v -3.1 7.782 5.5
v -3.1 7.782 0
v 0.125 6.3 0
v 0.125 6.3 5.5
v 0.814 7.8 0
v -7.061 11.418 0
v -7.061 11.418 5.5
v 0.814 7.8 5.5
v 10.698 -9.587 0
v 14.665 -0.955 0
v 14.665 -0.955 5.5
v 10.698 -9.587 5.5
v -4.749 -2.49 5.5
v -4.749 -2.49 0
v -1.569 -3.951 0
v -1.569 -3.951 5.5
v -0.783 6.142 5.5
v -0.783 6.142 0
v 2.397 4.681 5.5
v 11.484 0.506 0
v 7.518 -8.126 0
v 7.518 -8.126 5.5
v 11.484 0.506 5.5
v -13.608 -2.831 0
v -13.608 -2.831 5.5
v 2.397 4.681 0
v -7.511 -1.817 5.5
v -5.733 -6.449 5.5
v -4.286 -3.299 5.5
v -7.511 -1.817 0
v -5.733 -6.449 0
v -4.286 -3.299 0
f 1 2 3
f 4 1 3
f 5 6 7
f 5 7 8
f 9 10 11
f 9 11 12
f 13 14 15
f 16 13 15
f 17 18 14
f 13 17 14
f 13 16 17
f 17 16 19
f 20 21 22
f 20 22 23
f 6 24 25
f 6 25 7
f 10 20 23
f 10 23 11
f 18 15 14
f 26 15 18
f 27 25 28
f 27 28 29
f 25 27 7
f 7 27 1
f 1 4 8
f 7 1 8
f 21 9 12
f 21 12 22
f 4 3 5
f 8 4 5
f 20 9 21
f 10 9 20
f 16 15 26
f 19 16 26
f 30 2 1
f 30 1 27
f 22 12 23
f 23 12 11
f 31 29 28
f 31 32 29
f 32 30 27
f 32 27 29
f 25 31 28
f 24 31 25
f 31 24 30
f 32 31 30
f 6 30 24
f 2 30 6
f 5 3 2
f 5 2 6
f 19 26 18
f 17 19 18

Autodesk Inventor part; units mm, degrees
ref_plane "YZ Plane" through (0, 0, 0) normal (1, 0, 0) x (0, 1, 0)
ref_plane "XZ Plane" through (0, 0, 0) normal (0, 1, 0) x (-1, 0, 0)
ref_plane "XY Plane" through (0, 0, 0) normal (0, 0, 1) x (1, 0, 0)
ref_plane "Work Plane1" through (0, 0, 0) normal (0, 0, 1) x (1, 0, 0)
ref_plane "Work Plane2" through (15.8127, -3.2465, 0) normal (0, 0, -1) x (0.4175, 0.9087, 0)
sketch "Sketch1" plane through (15.8127, -3.2465, 0) normal (0, 0, -1) x (0.4175, 0.9087, 0)
  arc A0 (9.303, -26.8555) -> (8.303, -25.8555) centre (8.303, -26.8555) ccw construction
  line L0 (9.303, -26.8555) -> (9.303, -30) construction
  line L1 (9.303, -30) -> (-16.397, -30) construction
  line L2 (-16.397, -30) -> (-16.397, -20.4723) construction
  arc A1 (-15.397, -19.4723) -> (-16.397, -20.4723) centre (-15.397, -20.4723) ccw construction
  line L3 (-15.397, -19.4723) -> (-13.5347, -19.4723) construction
  arc A2 (-13.5347, -19.4723) -> (-12.5347, -18.4723) centre (-13.5347, -18.4723) ccw construction
  line L4 (-12.5347, -18.4723) -> (-12.5347, 0) construction
  line L5 (-12.5347, 0) -> (-1, 0) construction
  arc A3 (-1, 0) -> (0, 1) centre (-1, 1) ccw construction
  line L6 (0, 1) -> (0, 2) construction
  arc A4 (1, 3) -> (0, 2) centre (1, 2) ccw construction
  line L7 (1, 3) -> (3.5653, 3) construction
  arc A5 (4.5653, 2) -> (3.5653, 3) centre (3.5653, 2) ccw construction
  line L8 (4.5653, 2) -> (4.5653, -24.8555) construction
  arc A6 (4.5653, -24.8555) -> (5.5653, -25.8555) centre (5.5653, -24.8555) ccw construction
  line L9 (5.5653, -25.8555) -> (8.303, -25.8555) construction
  line L10 (2.603, -17.5) -> (2.603, -2) construction
  line L11 (2.603, -2) -> (-10.897, -2) construction
  line L12 (-10.897, -2) -> (-10.897, -17.5) construction
  line L13 (-10.897, -17.5) -> (2.603, -17.5) construction
  circle A7 centre (6.603, -27.5) radius 1 construction
  circle A8 centre (-13.897, -21) radius 1 construction
  circle A9 centre (1.603, 0.5) radius 1 construction
  line L14 (1.603, -19) -> (-7.897, -19)
  line L15 (-7.897, -19) -> (-7.897, -15.5)
  line L16 (-7.897, -15.5) -> (1.603, -15.5)
  line L17 (1.603, -15.5) -> (1.603, -19)
  line L18 (1.603, -2) -> (-7.897, -2)
  line L19 (-7.897, -2) -> (-7.897, -5.5)
  line L20 (-7.897, -5.5) -> (1.603, -5.5)
  line L21 (1.603, -5.5) -> (1.603, -2)
  point P0 (-3.6519, -15.7241)
  dimension "d0" = 9.5
  dimension "d1" = 3.5
  dimension "d2" = 9.5
  dimension "d3" = 3.5
  dimension "d4" = 0
  dimension "d5" = 2.5
  dimension "d6" = 10
  dimension "d7" = 0
extrude "Extrusion1" add sketch "Sketch1" against normal blind 5.5
ref_plane "Work Plane3" through (0, 0, -1) normal (0, 0, -1) x (-1, 0, 0)
sketch "Sketch2" plane through (15.8127, -3.2465, 0) normal (0, 0, -1) x (0.4175, 0.9087, 0)
  line L0 (-11.9051, -26.9073) -> (3.7761, -26.9073)
  line L1 (3.7761, -26.9073) -> (3.7761, -21.7902)
  line L2 (3.7761, -21.7902) -> (-11.9051, -21.7902)
  line L3 (-11.9051, -21.7902) -> (-11.9051, -26.9073)
  line L4 (3.7761, -21.7902) -> (2.1254, -21.7902)
  line L5 (2.1254, -21.7902) -> (2.1254, -18.2413)
  line L6 (2.1254, -18.2413) -> (3.7761, -18.2413)
  line L7 (3.7761, -18.2413) -> (3.7761, -21.7902)
  line L8 (-8.4388, -18.2413) -> (-11.9051, -18.2413)
  line L9 (-11.9051, -18.2413) -> (-11.9051, -21.7902)
  line L10 (-11.9051, -21.7902) -> (-8.4388, -21.7902)
  line L11 (-8.4388, -21.7902) -> (-8.4388, -18.2413)
  point P0 (-3.6519, -15.7241)
extrude "Extrusion2" add sketch "Sketch2" against normal blind 5.5
properties part number "00_KES_Bluray_Magnet"
